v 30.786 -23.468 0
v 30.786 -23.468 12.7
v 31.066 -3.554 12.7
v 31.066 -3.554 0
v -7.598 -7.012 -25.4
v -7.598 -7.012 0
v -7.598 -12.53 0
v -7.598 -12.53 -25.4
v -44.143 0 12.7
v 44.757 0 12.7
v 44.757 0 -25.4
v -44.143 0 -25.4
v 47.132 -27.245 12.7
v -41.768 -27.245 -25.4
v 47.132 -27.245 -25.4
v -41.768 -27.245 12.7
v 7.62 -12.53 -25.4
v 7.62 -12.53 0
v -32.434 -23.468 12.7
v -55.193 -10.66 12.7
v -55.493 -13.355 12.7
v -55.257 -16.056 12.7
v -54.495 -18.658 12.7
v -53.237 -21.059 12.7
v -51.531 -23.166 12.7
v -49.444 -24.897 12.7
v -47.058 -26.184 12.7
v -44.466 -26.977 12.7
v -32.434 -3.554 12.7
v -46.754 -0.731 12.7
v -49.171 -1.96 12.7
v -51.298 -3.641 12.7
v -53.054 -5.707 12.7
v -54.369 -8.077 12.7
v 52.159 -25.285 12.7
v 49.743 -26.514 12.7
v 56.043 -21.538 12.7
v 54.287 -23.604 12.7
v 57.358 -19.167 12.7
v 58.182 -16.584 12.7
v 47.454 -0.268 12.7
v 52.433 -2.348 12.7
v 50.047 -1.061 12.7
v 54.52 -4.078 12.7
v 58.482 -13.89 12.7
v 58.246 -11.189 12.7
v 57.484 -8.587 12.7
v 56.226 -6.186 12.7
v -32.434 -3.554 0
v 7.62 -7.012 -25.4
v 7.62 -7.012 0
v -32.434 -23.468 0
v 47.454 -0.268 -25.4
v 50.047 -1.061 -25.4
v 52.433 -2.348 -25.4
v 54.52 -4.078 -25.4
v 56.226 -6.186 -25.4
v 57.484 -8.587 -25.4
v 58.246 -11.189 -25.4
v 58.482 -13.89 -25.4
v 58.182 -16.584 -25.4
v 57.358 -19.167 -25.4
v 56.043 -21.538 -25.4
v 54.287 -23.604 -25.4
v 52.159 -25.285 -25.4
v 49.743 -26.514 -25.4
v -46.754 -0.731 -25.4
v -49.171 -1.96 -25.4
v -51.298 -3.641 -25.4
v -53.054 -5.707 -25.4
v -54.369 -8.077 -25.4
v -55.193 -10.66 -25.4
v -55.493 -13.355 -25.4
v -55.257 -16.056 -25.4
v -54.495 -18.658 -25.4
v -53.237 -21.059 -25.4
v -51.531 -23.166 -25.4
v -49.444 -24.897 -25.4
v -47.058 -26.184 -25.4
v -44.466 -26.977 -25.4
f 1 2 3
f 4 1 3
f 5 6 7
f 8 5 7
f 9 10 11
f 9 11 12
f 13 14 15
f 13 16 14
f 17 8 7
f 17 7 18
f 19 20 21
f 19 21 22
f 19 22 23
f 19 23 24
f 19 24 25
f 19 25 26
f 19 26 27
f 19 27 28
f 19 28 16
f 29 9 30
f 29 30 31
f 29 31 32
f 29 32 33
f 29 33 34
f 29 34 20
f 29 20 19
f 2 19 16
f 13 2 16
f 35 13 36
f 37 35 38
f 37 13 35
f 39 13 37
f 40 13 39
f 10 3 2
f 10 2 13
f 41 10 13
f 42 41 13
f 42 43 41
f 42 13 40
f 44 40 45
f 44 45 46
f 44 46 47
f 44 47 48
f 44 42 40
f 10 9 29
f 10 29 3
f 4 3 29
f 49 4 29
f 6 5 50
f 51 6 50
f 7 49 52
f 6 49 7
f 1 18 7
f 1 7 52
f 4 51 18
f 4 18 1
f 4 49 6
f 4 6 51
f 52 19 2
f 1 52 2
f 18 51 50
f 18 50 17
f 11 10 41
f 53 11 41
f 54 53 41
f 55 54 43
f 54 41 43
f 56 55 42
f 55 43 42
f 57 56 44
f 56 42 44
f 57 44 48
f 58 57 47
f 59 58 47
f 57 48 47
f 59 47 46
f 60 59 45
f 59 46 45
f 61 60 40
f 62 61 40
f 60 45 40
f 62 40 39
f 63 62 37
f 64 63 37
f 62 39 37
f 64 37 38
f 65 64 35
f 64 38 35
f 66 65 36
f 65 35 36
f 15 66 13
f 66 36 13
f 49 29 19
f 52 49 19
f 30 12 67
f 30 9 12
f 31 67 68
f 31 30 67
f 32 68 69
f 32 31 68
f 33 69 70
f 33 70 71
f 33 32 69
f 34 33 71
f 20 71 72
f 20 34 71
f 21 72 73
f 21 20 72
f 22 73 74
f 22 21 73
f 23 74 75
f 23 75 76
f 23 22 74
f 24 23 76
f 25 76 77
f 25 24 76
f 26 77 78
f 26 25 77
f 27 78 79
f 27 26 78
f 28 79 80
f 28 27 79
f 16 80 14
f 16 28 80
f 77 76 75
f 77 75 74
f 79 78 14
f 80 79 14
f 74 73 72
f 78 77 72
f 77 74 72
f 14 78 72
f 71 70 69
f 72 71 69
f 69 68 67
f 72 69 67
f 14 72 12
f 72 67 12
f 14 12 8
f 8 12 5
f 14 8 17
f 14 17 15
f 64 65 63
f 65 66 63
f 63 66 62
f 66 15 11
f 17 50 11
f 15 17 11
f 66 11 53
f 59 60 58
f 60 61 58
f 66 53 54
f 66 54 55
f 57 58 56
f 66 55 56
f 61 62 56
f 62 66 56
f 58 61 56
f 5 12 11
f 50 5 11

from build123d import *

# Parameters (mm, degrees)
F1_DEPTH  = 12.7
F4_DEPTH  = 25.4
F5_DEPTH  = 25.4
F7_DEPTH  = 12.7
F9_DEPTH  = 25.4
F10_W     = 2.54
F10_H     = 5.5179311894
F11_DEPTH = 25.4


with BuildPart() as f1:
    # F0 (on Top) → F1 (new body)
    with BuildSketch(Plane.XY):
        with BuildLine():
            Line((44.7565504849, 0), (-44.1434495151, 0))
            ThreePointArc((-44.1434495151, 0), (-55.4417593201, -14.7112042456), (-41.7676718473, -27.2447858006))
            Line((-41.7676718473, -27.2447858006), (47.1323281527, -27.2447858006))
            ThreePointArc((47.1323281527, -27.2447858006), (58.4306379576, -12.5335815549), (44.7565504849, 0))
        make_face()
    extrude(amount=F1_DEPTH)

    # F2 (on face) → F4 (join)
    with BuildSketch(Plane(origin=(0, 0, 0), x_dir=(1, 0, 0), z_dir=(0, 0, -1))):
        with BuildLine():
            Line((47.1323281527, 27.2447858006), (-34.4870686531, 27.2447858006))
            Line((-34.4870686531, 27.2447858006), (-34.4870686531, 0))
            Line((-34.4870686531, 0), (44.7565504849, 0))
            ThreePointArc((44.7565504849, 0), (58.4306379576, 12.5335815549), (47.1323281527, 27.2447858006))
        make_face()
    extrude(amount=F4_DEPTH)

    # F5 (add): a face of the model
    f5_faces = [f1.faces().sort_by_distance(p)[0] for p in [
        (-43.7953743511, -13.5694519924, 0),
    ]]
    extrude(f5_faces, amount=F5_DEPTH)

    # F6 (on face) → F7 (cut)
    with BuildSketch(Plane.XY.offset(12.7)):
        Polygon((30.7856556028, -23.4677214175), (31.0655402243, -3.554351395), (-32.4344597757, -3.554351395), (-32.4344597757, -23.4677214175), align=None)
    extrude(amount=-F7_DEPTH, mode=Mode.SUBTRACT)

    # F8 (on face) → F9 (cut)
    with BuildSketch(Plane(origin=(0, 0, -25.4), x_dir=(1, 0, 0), z_dir=(0, 0, -1))):
        Polygon((5.08, 12.5303016976), (0, 12.5303016976), (-5.058103241, 12.5303016976), (-5.058103241, 7.0123705082), (5.08, 7.0123705082), align=None)
    extrude(amount=-F9_DEPTH, mode=Mode.SUBTRACT)

    # F10 (on face) → F11 (cut)
    with BuildSketch(Plane(origin=(0, 0, -25.4), x_dir=(1, 0, 0), z_dir=(0, 0, -1))):
        with Locations((-6.328103241, 9.7713361029)):
            Rectangle(F10_W, F10_H)
        with Locations((6.35, 9.7713361029)):
            Rectangle(F10_W, F10_H)
    extrude(amount=-F11_DEPTH, mode=Mode.SUBTRACT)


solid = f1.part
